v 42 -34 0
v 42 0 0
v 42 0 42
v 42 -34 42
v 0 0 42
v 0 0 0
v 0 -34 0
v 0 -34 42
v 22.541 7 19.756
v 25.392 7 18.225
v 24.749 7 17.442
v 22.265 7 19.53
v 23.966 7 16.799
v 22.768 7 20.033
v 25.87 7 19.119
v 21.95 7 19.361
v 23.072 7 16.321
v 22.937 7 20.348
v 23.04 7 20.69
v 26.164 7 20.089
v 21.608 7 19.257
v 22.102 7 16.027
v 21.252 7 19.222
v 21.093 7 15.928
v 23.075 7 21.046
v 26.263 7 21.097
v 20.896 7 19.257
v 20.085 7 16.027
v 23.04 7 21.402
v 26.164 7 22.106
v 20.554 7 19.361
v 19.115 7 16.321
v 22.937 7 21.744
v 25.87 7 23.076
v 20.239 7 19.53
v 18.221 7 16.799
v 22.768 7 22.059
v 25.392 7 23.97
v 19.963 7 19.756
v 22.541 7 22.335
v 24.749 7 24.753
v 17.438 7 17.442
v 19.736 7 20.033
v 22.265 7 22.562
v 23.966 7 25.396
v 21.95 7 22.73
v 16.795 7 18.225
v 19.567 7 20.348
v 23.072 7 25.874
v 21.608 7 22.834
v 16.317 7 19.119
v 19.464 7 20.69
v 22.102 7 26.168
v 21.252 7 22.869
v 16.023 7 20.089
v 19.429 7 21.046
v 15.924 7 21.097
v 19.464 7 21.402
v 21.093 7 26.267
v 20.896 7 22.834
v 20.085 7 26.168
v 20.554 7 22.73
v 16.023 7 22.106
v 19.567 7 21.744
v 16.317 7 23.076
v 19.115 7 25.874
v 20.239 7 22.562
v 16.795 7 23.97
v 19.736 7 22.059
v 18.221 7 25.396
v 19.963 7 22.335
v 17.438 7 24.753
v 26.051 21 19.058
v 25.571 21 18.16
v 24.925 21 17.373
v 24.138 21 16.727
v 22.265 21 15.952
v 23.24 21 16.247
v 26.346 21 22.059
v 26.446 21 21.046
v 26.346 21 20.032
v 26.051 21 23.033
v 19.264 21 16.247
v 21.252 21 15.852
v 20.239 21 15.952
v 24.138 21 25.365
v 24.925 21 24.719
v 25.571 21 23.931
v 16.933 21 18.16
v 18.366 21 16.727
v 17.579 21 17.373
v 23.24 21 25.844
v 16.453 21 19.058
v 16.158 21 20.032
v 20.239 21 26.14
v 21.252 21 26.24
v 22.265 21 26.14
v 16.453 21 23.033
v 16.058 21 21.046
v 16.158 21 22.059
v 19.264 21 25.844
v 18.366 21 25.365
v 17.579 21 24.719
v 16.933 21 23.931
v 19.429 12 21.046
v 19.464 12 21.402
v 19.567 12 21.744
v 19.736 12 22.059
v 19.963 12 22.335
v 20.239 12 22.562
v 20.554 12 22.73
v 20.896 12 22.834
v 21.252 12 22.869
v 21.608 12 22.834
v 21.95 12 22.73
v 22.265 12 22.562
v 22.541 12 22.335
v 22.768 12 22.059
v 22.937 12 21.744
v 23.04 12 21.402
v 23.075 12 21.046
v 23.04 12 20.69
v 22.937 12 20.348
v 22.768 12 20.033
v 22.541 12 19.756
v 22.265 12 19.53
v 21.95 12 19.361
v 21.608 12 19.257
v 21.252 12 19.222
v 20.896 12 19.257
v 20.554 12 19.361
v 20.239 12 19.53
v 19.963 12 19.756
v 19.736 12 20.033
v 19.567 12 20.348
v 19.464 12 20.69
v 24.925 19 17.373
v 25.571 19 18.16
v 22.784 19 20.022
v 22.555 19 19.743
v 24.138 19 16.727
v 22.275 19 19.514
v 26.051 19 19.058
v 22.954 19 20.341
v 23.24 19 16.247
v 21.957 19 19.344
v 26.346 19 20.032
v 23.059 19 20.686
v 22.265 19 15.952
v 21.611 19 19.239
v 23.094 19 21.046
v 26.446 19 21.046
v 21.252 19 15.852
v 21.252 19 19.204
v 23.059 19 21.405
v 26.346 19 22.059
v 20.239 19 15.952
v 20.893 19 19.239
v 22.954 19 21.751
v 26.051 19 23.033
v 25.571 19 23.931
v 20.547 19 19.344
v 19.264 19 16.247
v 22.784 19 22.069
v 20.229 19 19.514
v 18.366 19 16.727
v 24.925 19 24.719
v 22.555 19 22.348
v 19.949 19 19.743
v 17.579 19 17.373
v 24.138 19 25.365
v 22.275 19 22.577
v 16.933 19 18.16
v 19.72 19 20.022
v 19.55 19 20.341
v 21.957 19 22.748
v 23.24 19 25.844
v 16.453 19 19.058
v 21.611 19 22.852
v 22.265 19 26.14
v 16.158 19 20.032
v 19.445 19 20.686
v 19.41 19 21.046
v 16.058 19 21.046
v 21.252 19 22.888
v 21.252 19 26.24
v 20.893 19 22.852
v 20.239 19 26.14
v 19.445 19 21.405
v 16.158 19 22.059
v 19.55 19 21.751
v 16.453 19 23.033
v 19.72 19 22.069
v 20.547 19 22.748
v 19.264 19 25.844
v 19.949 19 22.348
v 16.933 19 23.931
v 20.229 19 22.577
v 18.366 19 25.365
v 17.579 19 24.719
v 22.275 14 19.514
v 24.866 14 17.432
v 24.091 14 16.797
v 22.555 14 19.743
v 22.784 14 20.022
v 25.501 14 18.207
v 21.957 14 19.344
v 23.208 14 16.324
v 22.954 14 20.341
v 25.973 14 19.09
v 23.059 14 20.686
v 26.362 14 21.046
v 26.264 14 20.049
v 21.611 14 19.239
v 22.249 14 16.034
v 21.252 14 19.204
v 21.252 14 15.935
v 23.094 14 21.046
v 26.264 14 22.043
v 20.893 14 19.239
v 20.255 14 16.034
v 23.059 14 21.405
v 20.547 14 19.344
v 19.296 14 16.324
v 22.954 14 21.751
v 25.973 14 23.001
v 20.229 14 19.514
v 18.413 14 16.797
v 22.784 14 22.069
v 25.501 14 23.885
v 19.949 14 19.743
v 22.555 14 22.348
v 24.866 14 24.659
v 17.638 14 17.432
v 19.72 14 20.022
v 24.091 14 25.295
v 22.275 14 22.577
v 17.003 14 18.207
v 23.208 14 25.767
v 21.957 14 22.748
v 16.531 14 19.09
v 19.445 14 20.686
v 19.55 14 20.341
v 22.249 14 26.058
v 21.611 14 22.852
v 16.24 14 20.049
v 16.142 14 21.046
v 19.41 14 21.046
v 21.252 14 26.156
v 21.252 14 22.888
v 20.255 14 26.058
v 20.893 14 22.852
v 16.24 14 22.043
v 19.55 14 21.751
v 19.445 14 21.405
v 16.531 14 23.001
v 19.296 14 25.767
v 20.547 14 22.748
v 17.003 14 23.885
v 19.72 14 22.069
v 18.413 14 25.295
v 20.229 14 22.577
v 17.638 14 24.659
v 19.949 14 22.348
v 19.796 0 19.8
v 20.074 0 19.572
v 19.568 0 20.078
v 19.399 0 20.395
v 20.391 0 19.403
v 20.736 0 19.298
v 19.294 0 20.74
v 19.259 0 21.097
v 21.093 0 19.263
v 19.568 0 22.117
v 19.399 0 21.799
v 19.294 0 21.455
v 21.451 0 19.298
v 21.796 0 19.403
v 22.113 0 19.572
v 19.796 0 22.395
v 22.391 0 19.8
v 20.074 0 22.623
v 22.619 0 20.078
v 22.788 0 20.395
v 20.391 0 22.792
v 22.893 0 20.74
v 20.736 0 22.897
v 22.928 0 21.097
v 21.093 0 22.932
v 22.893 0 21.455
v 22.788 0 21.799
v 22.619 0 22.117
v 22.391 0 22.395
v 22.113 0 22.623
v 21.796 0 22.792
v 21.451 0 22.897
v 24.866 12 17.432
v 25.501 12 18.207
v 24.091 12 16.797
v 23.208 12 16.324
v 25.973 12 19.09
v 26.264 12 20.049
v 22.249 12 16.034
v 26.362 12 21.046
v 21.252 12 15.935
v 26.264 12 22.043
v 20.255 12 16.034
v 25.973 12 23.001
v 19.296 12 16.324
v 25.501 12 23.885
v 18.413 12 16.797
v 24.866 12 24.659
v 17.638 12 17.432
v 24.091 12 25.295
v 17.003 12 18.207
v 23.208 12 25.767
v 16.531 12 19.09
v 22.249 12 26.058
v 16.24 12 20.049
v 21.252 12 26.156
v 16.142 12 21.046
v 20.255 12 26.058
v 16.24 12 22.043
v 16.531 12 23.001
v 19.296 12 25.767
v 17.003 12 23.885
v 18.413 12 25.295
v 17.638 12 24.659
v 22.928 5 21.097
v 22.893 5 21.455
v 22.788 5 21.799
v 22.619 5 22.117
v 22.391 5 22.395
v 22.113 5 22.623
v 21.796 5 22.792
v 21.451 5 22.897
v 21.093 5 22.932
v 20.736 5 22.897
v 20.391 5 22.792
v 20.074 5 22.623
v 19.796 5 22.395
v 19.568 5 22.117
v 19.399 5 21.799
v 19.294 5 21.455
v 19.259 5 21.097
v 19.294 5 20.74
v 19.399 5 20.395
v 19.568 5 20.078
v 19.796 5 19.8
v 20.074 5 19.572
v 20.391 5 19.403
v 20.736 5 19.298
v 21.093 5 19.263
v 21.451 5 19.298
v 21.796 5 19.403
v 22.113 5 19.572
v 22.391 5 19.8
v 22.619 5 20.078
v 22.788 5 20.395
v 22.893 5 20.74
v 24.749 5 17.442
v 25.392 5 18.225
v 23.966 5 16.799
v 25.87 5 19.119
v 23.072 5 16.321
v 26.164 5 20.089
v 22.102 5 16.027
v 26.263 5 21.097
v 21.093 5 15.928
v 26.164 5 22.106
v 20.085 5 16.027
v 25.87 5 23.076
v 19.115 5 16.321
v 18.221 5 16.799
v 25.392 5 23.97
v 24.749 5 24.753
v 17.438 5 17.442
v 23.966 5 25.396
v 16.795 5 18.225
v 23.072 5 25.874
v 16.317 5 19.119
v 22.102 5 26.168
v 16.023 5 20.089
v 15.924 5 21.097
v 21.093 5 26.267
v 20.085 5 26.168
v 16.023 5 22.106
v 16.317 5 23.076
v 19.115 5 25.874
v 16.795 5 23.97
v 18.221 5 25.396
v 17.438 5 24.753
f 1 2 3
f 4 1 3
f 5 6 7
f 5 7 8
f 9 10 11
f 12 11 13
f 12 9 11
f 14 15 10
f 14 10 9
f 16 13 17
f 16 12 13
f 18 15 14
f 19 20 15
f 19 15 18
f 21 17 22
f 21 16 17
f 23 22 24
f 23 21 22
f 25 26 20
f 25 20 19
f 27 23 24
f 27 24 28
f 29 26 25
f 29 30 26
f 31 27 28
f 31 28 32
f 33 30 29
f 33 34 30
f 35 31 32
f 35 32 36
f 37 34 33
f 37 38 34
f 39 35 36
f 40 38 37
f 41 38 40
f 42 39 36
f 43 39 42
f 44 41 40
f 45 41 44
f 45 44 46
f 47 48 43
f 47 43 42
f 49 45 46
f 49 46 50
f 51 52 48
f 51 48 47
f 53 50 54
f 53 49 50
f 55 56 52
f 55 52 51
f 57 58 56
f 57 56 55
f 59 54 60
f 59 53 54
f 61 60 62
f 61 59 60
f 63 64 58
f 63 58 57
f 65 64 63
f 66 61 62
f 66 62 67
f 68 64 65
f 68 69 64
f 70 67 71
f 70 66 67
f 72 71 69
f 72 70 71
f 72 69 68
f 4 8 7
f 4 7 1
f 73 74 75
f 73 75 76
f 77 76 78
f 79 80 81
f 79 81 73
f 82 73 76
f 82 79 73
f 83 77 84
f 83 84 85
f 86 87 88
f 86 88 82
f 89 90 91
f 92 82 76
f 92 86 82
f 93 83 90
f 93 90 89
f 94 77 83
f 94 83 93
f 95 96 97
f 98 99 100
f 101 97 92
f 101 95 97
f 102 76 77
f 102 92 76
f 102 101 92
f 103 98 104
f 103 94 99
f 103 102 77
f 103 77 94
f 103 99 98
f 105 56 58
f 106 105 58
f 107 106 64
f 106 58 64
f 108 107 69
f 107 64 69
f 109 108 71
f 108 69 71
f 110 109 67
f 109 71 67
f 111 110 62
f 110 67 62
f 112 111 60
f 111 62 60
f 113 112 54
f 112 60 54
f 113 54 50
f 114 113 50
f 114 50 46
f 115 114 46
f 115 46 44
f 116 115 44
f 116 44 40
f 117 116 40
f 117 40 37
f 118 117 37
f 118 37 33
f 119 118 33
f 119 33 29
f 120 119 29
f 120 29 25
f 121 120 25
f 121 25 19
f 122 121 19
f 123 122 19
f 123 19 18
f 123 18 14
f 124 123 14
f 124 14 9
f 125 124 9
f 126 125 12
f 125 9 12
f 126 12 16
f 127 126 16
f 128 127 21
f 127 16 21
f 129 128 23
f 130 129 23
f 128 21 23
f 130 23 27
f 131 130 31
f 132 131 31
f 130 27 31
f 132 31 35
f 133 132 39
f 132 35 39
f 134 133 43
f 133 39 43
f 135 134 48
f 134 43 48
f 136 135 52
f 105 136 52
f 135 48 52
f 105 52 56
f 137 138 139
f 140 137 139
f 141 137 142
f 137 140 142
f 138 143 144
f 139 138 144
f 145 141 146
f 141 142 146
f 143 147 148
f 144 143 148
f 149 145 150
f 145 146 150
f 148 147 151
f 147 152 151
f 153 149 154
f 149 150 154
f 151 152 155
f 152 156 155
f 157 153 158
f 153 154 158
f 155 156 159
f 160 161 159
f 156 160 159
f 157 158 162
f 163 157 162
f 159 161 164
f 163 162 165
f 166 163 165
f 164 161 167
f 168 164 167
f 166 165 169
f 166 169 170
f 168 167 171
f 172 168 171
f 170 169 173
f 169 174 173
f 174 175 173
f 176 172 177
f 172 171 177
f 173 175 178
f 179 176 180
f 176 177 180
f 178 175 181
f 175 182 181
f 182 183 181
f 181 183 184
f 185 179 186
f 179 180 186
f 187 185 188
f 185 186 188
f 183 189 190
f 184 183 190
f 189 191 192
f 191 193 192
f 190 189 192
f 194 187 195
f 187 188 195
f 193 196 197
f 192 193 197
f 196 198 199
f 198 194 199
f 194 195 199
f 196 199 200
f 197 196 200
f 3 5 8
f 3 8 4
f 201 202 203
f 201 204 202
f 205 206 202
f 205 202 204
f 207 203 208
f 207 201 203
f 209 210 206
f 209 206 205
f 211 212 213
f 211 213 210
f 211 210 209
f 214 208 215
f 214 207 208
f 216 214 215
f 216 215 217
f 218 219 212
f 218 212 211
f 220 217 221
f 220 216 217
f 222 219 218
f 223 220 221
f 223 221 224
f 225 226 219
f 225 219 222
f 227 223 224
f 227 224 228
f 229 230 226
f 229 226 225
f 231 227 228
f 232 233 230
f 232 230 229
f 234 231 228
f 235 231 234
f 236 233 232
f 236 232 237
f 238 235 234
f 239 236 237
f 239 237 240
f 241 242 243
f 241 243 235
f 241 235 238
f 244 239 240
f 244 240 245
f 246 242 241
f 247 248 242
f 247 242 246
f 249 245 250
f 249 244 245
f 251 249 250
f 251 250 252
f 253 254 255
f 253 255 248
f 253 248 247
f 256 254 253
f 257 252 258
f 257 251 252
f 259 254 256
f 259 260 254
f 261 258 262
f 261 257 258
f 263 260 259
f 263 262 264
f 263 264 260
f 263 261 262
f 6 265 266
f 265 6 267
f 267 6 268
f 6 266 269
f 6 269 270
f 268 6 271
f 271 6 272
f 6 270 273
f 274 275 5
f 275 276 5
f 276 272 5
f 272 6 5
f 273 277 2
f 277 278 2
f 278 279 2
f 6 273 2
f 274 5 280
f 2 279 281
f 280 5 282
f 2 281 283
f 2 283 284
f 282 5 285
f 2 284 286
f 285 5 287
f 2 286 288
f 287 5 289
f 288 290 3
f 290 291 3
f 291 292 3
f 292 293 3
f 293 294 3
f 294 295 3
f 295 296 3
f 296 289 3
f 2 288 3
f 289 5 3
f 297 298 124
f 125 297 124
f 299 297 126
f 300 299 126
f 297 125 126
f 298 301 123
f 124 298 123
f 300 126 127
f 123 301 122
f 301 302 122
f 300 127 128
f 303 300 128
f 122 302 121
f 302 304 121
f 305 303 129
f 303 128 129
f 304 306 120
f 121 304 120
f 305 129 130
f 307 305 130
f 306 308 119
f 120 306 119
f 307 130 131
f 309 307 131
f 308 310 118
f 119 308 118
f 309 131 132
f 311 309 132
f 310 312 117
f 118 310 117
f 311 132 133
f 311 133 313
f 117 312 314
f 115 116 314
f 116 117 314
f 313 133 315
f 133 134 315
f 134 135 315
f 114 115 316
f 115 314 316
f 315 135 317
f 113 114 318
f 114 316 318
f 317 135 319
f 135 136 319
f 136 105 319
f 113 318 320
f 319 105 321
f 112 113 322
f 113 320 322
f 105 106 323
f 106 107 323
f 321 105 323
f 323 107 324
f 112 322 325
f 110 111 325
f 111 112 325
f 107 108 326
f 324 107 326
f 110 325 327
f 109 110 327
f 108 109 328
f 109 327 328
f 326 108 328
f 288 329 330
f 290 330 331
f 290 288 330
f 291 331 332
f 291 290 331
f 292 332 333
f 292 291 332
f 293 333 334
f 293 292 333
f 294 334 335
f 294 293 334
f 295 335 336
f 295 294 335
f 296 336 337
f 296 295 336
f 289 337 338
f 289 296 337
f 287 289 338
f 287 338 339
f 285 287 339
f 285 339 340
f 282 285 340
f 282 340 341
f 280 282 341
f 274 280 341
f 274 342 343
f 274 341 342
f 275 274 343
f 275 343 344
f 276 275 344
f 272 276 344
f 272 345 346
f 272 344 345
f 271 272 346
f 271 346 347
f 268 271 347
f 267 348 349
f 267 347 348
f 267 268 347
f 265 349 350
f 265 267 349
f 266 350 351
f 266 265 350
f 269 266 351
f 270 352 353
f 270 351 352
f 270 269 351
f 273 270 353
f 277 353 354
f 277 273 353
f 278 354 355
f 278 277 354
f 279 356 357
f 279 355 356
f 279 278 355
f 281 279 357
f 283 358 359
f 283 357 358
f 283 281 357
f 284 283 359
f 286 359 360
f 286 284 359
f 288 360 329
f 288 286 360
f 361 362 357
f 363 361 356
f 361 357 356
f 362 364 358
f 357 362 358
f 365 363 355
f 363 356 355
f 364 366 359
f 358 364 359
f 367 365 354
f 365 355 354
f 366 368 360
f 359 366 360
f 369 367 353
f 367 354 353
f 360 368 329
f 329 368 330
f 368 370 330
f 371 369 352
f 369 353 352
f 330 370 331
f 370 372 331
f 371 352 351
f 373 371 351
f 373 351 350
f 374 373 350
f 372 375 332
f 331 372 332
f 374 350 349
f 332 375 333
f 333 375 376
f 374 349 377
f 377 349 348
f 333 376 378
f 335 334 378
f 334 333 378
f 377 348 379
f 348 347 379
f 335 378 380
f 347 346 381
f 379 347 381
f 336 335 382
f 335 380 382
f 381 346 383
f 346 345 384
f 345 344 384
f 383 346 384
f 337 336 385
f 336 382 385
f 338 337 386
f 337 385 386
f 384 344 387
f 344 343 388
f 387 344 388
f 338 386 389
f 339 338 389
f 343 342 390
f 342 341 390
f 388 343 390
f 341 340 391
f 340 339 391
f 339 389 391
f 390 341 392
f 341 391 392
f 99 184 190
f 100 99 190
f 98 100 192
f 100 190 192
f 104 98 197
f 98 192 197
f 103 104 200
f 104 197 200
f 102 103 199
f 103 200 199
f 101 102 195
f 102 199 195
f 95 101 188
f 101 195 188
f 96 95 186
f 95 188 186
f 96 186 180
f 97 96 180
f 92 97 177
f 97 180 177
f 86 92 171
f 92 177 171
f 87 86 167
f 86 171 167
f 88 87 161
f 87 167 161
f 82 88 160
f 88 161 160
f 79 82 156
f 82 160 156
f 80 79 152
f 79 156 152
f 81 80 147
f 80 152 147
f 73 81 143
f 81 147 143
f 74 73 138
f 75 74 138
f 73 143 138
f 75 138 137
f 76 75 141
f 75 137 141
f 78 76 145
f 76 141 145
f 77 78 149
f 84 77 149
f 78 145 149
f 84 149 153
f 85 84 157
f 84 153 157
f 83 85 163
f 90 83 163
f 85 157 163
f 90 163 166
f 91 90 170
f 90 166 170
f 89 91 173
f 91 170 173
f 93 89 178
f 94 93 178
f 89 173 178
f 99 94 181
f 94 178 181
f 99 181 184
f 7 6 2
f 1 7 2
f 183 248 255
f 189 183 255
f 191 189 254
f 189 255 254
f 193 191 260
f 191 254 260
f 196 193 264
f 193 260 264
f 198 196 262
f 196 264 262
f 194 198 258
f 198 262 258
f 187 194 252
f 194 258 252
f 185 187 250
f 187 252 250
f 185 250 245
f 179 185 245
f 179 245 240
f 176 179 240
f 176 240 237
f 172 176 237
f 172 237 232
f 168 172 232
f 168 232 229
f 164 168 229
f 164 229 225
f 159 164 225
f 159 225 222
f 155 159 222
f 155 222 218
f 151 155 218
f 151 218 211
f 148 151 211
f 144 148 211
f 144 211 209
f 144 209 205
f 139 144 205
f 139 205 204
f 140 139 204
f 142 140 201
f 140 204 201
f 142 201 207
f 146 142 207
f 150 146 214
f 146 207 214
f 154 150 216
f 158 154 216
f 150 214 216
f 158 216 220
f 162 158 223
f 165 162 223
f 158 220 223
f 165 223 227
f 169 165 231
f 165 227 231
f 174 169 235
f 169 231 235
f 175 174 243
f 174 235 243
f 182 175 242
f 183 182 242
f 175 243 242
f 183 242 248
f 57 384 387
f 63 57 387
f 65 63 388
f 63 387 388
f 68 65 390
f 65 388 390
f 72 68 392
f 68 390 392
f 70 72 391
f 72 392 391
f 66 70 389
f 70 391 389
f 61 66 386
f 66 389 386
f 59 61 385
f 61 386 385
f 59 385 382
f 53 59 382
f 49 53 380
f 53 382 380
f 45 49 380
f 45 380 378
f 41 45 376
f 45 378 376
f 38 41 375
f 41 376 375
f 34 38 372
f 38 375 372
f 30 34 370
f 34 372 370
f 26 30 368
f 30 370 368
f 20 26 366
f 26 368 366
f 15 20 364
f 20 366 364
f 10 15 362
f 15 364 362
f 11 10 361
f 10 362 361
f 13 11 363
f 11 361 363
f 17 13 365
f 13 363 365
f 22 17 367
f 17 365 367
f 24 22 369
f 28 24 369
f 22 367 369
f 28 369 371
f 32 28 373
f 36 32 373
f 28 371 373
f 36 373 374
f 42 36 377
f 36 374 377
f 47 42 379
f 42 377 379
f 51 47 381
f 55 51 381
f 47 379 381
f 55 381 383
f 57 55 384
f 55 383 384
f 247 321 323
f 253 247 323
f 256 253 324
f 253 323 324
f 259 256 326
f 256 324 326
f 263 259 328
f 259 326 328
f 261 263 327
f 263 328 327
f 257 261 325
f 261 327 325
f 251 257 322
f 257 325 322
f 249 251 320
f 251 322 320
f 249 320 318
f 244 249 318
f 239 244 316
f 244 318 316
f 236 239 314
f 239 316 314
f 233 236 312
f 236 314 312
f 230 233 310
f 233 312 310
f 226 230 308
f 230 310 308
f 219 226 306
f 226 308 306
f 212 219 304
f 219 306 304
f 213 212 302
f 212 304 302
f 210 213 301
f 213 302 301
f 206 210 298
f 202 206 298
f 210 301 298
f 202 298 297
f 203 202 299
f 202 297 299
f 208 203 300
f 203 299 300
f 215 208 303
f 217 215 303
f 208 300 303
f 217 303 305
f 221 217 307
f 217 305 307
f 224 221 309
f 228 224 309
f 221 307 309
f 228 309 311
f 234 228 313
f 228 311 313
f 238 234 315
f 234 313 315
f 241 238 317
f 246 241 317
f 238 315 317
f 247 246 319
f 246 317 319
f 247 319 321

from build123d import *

# Parameters (mm, degrees)
F0_W      = 42
F0_H      = 42
F1_DEPTH  = 34
F2_R      = 1.834542
F3_DEPTH  = 5
F4_R      = 5.169646
F5_DEPTH  = 2
F6_R      = 1.823353
F7_DEPTH  = 7
F8_R      = 5.110436
F9_DEPTH  = 2
F10_R     = 1.842077
F11_DEPTH = 7
F12_R     = 5.194055
F13_DEPTH = 2


with BuildPart() as f1:
    # F0 (on Front) → F1 (new body)
    with BuildSketch(Plane.XZ):
        with Locations((21, 21)):
            Rectangle(F0_W, F0_H)
    extrude(amount=F1_DEPTH)

    # F2 (on face) → F3 (join)
    with BuildSketch(Plane.XZ):
        with Locations((21.093497, 21.097444)):
            Circle(F2_R)
    extrude(amount=-F3_DEPTH)

    # F4 (on face) → F5 (join)
    with BuildSketch(Plane(origin=(0, 5, 0), x_dir=(-1, 0, 0), z_dir=(0, 1, 0))):
        with Locations((-21.093497, 21.097444)):
            Circle(F4_R)
    extrude(amount=F5_DEPTH)

    # F6 (on face) → F7 (join)
    with BuildSketch(Plane(origin=(0, 5, 0), x_dir=(-1, 0, 0), z_dir=(0, 1, 0))):
        with Locations((-21.252004, 21.045802)):
            Circle(F6_R)
    extrude(amount=F7_DEPTH)

    # F8 (on face) → F9 (join)
    with BuildSketch(Plane(origin=(0, 12, 0), x_dir=(-1, 0, 0), z_dir=(0, 1, 0))):
        with Locations((-21.252004, 21.045802)):
            Circle(F8_R)
    extrude(amount=F9_DEPTH)

    # F10 (on face) → F11 (join)
    with BuildSketch(Plane(origin=(0, 12, 0), x_dir=(-1, 0, 0), z_dir=(0, 1, 0))):
        with Locations((-21.252004, 21.045802)):
            Circle(F10_R)
    extrude(amount=F11_DEPTH)

    # F12 (on face) → F13 (join)
    with BuildSketch(Plane(origin=(0, 19, 0), x_dir=(-1, 0, 0), z_dir=(0, 1, 0))):
        with Locations((-21.252004, 21.045802)):
            Circle(F12_R)
    extrude(amount=F13_DEPTH)


solid = f1.part
